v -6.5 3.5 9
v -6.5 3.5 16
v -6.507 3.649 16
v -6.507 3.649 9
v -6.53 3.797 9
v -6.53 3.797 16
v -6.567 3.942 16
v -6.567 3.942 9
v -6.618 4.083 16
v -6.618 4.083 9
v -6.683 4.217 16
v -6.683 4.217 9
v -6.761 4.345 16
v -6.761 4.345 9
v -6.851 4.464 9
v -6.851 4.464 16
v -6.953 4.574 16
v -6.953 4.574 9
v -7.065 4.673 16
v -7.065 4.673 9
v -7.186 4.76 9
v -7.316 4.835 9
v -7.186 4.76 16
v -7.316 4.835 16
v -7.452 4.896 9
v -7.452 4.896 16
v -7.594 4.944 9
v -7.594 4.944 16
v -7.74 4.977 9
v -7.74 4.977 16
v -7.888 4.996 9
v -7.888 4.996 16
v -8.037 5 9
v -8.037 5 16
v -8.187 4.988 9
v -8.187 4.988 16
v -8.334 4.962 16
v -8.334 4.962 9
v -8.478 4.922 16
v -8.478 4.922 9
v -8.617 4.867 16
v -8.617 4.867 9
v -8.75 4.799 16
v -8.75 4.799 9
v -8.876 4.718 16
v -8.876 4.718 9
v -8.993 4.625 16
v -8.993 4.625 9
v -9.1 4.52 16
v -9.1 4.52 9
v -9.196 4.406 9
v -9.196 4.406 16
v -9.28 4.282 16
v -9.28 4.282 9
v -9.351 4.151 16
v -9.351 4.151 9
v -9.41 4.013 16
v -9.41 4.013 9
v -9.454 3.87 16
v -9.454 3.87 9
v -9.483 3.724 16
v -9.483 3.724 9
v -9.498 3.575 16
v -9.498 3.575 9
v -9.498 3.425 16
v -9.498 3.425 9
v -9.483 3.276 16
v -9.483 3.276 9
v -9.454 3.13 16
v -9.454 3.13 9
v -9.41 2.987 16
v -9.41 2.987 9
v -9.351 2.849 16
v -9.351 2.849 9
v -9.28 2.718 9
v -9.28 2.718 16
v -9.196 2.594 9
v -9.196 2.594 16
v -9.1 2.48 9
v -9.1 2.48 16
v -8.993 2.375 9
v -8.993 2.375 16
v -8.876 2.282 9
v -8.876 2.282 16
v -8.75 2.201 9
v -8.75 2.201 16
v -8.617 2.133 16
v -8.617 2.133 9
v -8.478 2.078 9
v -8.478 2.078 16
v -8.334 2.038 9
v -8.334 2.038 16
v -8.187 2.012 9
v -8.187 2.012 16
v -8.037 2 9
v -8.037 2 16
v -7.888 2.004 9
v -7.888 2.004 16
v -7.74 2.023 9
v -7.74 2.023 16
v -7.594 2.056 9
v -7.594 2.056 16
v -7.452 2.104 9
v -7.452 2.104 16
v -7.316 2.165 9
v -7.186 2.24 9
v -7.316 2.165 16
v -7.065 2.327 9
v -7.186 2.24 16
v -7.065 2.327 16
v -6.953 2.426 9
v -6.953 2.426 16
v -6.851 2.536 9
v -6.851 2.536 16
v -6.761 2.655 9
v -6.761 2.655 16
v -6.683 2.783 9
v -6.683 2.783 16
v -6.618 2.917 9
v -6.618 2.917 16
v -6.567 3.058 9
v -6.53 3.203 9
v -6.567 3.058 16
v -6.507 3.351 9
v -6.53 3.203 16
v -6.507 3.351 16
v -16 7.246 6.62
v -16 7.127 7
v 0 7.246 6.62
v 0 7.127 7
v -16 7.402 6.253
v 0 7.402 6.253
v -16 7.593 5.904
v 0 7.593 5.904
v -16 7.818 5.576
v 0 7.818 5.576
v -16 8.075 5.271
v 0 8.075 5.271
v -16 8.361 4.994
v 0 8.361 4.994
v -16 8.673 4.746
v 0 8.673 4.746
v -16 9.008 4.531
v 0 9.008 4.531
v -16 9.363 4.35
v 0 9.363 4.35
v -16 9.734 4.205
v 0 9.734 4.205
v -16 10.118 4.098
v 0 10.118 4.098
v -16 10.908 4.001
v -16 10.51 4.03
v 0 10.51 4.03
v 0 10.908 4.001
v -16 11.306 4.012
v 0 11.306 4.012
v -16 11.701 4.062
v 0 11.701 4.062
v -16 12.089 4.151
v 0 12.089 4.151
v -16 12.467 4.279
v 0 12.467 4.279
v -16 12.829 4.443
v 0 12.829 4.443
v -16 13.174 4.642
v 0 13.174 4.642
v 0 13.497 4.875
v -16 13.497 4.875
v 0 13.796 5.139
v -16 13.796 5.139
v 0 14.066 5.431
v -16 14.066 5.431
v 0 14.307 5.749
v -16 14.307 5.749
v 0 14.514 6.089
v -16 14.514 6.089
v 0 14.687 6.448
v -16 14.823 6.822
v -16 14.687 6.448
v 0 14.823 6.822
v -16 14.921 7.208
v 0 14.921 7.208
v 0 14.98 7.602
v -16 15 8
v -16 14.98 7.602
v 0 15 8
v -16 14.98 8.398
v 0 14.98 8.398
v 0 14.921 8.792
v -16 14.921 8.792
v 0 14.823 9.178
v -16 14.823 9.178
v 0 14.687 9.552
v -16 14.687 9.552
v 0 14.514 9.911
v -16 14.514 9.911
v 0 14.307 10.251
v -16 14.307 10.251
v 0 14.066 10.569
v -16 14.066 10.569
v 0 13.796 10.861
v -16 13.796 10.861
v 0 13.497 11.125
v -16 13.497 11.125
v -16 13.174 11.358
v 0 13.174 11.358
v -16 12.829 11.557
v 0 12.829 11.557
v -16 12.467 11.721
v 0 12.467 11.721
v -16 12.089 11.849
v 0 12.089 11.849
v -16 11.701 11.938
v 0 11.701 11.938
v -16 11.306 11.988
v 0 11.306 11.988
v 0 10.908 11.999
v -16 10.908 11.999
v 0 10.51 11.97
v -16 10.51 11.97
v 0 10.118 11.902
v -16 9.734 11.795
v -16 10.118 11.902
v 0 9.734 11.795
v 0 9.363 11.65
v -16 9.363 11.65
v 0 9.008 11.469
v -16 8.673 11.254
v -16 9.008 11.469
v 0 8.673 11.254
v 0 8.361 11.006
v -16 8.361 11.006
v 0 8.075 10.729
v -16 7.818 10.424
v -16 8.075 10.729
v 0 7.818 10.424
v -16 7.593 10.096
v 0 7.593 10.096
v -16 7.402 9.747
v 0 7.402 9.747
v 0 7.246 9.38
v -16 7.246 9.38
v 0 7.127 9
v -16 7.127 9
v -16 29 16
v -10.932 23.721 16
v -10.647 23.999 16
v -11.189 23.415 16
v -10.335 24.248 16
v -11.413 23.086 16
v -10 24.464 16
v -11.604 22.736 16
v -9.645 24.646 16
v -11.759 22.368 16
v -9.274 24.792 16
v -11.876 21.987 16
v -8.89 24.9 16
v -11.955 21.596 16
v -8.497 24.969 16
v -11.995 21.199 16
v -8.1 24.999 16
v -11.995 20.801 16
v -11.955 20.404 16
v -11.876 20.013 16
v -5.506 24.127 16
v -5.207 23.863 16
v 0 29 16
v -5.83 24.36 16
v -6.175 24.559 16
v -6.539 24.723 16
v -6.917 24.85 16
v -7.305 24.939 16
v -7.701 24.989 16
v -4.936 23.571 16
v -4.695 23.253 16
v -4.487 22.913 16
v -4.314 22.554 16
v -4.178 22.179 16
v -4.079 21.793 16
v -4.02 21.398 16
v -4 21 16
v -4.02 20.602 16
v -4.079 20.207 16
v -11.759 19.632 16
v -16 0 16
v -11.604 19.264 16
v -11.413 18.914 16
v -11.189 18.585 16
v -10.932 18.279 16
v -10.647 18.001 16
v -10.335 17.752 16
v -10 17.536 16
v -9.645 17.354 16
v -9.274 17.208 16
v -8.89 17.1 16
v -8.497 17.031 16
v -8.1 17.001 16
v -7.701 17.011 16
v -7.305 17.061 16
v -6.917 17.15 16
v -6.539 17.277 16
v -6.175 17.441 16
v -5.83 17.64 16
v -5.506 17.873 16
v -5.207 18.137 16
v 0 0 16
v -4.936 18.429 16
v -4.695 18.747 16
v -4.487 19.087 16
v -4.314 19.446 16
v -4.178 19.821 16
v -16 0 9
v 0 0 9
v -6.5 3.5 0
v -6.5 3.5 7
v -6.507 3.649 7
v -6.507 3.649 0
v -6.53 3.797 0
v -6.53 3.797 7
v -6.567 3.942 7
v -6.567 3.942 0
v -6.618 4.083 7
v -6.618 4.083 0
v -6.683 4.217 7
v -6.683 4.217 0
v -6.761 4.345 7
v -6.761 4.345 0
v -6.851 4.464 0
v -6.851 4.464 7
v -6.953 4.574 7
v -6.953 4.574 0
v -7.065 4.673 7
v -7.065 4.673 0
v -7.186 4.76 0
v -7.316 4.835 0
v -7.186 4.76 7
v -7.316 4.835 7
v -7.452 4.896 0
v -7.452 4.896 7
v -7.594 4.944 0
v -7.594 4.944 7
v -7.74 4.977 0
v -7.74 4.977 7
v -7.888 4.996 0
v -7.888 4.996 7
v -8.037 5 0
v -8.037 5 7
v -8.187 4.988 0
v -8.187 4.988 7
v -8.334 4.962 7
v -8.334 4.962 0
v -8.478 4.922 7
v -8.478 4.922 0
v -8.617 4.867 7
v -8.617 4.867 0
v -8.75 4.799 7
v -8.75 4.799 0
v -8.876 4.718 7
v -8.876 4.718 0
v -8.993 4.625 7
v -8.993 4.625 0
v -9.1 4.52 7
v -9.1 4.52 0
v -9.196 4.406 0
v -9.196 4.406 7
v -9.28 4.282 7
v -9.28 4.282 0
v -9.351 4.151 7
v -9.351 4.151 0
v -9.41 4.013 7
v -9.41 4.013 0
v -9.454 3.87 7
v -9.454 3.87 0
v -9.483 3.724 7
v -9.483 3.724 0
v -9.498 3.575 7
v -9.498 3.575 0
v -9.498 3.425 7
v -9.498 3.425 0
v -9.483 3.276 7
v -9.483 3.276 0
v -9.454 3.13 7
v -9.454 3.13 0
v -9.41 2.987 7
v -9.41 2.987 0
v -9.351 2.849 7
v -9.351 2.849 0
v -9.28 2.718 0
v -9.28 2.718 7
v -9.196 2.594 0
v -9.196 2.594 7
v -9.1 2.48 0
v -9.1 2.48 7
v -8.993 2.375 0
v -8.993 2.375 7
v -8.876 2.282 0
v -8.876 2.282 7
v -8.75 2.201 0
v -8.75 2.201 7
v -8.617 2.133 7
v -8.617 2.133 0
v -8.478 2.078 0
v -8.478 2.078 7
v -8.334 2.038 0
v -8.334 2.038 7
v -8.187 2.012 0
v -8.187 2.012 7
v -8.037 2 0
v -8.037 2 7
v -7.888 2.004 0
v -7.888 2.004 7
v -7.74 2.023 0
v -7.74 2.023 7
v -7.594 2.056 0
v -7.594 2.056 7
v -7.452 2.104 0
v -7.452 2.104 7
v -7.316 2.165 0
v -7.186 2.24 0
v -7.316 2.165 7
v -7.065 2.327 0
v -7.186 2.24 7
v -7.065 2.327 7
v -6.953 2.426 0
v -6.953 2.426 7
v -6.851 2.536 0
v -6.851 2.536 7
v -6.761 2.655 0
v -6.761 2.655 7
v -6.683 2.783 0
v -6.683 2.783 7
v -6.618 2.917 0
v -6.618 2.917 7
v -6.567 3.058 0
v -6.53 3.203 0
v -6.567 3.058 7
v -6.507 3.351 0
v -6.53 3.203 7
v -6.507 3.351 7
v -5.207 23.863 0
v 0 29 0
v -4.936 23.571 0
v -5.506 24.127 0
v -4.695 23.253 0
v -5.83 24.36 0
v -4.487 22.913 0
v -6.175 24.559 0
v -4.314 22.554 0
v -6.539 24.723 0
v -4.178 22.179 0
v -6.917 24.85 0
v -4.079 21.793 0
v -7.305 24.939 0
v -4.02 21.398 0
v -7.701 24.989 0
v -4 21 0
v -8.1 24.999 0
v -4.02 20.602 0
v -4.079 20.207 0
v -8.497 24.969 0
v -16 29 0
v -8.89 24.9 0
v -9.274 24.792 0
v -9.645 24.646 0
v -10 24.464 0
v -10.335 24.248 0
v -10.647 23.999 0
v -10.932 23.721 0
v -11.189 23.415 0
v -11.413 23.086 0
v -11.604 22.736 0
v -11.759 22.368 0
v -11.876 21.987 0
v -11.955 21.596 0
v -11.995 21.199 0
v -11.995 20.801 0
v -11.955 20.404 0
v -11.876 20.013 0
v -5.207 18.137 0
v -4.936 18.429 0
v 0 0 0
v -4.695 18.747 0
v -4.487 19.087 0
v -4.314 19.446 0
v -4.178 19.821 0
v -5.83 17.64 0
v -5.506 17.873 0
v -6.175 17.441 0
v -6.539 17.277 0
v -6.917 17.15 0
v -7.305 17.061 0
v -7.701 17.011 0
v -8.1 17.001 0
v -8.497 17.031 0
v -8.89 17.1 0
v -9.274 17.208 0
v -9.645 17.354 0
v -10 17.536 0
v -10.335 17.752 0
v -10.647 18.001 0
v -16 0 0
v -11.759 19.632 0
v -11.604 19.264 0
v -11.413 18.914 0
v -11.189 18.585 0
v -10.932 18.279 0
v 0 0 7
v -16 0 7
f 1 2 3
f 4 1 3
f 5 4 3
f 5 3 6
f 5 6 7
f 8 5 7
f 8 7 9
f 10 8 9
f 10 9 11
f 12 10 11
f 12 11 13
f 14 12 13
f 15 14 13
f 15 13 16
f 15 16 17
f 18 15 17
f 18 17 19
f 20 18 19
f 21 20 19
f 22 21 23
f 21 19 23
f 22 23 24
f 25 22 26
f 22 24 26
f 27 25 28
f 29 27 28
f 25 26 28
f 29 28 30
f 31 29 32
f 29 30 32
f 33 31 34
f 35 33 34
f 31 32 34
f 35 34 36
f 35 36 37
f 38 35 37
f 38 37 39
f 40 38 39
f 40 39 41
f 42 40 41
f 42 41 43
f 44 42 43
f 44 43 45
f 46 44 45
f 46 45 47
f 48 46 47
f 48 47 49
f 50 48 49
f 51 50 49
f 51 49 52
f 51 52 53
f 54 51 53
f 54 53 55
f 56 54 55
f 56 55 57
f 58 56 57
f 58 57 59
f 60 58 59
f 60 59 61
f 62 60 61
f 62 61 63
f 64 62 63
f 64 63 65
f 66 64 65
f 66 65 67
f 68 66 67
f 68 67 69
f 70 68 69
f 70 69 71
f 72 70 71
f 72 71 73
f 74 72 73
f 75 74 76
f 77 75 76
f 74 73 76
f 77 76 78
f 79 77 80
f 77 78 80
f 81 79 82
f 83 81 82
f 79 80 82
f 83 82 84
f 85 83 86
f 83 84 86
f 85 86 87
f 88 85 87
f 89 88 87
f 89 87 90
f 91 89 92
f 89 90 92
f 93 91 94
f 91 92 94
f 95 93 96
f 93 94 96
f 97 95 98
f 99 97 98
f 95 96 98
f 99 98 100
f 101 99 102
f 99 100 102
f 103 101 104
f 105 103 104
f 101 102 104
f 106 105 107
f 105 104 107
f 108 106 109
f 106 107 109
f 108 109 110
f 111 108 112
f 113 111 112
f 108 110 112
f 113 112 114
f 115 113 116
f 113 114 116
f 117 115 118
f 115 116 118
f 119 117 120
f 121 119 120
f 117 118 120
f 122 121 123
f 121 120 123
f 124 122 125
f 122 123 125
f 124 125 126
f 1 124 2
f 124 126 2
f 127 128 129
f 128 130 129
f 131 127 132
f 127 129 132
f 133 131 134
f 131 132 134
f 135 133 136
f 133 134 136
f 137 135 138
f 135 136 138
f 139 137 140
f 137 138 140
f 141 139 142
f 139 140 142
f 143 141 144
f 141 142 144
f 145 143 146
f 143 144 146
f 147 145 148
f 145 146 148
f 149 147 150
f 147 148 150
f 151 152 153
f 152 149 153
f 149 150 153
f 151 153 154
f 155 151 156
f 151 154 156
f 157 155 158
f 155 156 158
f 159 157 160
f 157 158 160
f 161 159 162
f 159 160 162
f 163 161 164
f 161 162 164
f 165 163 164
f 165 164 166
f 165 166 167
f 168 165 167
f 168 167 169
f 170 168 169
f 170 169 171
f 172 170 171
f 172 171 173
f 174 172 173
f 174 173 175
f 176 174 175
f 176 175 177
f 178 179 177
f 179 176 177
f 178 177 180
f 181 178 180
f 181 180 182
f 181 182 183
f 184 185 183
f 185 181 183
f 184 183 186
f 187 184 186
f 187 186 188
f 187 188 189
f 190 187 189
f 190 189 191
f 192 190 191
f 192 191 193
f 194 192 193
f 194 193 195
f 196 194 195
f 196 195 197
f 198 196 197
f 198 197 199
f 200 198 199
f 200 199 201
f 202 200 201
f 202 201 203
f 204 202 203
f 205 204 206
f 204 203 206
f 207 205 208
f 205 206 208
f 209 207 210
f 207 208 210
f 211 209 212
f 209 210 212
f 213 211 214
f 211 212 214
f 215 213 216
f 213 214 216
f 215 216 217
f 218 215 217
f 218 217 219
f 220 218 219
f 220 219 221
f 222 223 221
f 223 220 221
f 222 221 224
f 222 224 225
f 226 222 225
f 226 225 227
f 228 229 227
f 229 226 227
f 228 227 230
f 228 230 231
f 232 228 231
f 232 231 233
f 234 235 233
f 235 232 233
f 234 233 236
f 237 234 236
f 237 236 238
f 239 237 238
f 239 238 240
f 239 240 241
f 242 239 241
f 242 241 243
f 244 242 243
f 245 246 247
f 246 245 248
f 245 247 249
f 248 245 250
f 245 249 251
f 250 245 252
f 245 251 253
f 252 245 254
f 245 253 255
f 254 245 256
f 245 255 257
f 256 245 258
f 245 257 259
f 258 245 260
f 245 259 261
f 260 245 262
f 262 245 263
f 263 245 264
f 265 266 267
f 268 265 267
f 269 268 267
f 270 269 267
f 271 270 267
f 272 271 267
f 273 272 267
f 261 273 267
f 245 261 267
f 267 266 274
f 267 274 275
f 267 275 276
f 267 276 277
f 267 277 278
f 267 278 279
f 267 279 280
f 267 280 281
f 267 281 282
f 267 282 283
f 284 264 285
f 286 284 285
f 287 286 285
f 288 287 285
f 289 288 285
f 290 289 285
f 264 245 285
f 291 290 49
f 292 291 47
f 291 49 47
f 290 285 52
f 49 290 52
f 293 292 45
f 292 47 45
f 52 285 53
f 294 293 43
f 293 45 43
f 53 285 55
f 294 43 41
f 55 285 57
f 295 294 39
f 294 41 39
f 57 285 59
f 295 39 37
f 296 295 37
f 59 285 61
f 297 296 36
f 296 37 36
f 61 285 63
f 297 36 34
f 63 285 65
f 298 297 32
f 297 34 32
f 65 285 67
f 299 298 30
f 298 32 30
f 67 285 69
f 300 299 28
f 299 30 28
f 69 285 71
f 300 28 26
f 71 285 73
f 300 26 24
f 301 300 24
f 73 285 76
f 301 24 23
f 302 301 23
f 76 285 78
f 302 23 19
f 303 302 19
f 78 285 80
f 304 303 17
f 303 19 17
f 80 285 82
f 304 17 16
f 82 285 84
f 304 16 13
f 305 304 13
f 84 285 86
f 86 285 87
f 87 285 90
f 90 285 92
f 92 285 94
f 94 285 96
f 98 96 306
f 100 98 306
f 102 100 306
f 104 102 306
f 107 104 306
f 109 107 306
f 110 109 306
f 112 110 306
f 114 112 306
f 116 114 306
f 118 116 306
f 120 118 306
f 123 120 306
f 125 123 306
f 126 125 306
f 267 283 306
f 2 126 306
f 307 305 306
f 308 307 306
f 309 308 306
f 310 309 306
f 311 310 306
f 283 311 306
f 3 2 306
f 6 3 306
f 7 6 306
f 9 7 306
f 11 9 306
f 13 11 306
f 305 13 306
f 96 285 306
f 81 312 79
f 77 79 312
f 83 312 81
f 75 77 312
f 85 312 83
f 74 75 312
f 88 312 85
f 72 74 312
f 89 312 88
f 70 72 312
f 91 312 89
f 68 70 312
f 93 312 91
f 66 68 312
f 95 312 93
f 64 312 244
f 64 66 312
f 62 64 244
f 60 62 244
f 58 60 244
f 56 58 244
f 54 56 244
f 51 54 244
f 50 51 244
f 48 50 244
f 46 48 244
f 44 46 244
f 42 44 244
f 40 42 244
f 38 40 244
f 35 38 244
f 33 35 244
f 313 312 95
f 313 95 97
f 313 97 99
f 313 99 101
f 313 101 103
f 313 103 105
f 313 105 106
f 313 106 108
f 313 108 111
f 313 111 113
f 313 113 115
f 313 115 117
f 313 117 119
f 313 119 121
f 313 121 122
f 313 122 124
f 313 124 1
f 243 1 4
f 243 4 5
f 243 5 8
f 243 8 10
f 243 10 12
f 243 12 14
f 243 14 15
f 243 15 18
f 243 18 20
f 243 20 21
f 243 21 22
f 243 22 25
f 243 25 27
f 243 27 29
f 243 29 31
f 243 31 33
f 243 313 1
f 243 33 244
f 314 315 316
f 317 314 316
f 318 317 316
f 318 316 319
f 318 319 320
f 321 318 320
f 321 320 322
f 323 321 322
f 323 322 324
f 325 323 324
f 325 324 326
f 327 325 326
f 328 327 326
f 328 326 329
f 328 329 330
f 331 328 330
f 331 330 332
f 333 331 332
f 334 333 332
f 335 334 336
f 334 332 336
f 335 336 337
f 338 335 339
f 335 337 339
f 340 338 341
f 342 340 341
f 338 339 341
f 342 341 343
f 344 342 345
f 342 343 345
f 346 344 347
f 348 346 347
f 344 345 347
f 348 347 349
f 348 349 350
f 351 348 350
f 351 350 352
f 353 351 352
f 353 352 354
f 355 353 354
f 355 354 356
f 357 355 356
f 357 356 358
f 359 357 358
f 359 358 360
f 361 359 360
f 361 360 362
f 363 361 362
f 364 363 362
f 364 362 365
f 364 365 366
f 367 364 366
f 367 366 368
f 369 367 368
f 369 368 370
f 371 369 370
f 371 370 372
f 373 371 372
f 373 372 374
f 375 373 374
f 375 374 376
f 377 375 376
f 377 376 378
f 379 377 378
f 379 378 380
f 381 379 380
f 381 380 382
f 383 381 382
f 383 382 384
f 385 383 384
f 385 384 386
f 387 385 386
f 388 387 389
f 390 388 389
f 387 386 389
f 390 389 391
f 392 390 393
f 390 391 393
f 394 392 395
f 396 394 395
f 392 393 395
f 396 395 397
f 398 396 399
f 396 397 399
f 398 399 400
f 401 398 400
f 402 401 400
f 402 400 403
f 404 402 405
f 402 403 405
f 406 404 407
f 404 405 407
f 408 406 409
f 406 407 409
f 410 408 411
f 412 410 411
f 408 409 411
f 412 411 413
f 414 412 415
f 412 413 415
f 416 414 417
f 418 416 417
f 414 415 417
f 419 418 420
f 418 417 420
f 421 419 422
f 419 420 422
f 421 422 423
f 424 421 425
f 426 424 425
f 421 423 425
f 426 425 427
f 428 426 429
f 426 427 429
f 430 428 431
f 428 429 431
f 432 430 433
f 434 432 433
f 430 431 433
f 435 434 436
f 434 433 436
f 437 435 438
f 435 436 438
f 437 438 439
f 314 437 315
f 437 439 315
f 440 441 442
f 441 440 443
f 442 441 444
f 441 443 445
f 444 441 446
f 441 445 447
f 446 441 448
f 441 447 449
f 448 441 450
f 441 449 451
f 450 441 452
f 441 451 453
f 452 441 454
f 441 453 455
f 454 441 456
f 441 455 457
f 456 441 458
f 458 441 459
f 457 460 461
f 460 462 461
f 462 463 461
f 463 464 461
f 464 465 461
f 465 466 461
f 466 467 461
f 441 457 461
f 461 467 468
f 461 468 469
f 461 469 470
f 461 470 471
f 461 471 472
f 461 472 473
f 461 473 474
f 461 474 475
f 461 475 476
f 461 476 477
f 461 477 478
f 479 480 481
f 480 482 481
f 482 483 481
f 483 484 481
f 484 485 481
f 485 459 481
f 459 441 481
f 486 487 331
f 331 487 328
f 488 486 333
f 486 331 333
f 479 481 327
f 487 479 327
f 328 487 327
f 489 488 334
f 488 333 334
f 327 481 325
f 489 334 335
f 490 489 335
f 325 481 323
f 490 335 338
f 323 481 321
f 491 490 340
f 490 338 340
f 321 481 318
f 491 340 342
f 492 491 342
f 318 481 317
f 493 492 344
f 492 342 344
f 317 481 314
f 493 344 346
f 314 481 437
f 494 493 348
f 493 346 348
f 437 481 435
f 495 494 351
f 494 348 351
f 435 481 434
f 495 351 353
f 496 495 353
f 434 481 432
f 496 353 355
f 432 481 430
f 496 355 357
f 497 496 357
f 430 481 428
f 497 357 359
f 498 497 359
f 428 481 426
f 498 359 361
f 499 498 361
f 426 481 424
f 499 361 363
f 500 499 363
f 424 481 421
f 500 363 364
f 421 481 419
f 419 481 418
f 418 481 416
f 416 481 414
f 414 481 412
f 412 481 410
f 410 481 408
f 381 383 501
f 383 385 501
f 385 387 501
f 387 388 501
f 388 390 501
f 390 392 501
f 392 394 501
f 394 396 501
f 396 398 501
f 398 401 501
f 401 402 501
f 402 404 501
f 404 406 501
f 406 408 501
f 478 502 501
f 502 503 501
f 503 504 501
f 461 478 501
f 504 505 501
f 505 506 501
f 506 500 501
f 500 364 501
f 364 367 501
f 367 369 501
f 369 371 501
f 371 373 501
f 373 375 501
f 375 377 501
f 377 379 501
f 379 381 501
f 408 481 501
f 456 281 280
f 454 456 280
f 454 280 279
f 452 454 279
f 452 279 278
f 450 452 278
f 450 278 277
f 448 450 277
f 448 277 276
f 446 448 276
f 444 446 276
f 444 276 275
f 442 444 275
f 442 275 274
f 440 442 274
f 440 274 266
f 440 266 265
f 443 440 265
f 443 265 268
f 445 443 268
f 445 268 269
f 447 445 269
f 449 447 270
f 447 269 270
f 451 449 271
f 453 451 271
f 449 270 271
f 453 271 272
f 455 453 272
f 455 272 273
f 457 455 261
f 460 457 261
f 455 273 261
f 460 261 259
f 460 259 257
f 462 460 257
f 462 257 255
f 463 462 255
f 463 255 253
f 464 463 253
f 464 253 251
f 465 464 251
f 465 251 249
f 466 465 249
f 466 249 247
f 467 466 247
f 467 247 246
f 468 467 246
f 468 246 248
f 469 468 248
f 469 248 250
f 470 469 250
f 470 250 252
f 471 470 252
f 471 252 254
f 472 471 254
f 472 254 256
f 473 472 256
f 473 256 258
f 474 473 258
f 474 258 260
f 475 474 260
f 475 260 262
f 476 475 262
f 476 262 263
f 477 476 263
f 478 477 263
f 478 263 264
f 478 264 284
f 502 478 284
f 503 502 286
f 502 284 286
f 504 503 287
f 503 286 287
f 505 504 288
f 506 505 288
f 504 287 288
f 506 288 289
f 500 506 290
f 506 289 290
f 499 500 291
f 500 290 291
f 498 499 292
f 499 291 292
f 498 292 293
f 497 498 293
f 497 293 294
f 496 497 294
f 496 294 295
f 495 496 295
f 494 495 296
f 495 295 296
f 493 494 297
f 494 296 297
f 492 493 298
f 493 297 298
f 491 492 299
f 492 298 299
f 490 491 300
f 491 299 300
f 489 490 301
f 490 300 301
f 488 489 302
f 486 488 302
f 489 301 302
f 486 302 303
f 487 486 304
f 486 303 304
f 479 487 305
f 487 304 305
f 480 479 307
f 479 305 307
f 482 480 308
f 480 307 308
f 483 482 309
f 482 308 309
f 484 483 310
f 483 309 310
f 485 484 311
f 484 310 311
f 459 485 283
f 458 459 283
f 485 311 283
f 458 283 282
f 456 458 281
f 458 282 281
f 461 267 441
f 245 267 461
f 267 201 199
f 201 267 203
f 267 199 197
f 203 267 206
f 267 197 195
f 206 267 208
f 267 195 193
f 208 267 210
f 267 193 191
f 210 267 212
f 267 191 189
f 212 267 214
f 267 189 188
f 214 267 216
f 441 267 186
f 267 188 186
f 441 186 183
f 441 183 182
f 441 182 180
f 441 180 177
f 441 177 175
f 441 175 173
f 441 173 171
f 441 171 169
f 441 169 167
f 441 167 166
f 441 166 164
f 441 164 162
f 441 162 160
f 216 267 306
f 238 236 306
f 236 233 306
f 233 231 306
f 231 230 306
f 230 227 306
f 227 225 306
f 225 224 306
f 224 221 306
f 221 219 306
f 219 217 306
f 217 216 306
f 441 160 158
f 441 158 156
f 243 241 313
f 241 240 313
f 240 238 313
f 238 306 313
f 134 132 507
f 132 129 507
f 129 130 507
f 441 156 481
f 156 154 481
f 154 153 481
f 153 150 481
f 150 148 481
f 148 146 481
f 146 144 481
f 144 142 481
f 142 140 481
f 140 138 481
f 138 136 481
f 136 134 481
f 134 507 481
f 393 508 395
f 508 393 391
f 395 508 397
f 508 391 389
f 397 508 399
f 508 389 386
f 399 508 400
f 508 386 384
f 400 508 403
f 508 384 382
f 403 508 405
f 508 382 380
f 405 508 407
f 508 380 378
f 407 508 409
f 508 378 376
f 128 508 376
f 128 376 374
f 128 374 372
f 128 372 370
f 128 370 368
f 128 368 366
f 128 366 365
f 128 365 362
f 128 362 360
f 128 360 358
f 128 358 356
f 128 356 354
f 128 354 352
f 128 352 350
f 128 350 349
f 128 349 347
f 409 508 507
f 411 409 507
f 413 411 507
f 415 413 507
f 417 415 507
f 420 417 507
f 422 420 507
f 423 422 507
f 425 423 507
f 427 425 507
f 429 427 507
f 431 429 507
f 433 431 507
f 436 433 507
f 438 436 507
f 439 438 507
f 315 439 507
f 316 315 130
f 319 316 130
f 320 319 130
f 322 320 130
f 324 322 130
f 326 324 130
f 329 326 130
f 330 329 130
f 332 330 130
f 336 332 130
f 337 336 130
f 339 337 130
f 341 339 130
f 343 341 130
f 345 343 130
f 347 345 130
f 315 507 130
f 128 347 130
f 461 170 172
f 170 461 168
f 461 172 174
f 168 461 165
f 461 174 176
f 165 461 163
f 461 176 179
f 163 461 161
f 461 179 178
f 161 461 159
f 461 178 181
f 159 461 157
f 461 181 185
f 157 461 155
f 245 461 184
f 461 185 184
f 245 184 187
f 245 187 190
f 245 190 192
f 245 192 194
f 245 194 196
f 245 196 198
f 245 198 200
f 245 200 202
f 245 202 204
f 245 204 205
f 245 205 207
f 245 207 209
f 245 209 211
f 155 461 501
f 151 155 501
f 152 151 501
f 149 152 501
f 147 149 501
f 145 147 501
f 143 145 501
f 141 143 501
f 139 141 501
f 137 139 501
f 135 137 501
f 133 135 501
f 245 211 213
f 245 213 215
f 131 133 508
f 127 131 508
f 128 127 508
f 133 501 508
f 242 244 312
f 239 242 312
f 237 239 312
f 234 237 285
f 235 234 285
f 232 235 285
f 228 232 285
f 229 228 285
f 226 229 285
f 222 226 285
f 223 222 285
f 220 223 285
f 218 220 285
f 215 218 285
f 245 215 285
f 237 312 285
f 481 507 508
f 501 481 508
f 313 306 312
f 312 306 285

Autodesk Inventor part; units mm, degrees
ref_plane "YZ Plane" through (0, 0, 0) normal (1, 0, 0) x (0, 1, 0)
ref_plane "XZ Plane" through (0, 0, 0) normal (0, 1, 0) x (-1, 0, 0)
ref_plane "XY Plane" through (0, 0, 0) normal (0, 0, 1) x (1, 0, 0)
sketch "Sketch1" plane through (0, 0, 0) normal (0, 1, 0) x (-1, 0, 0)
  line L0 (0, 0) -> (16, 0)
  line L1 (16, 0) -> (16, 16)
  line L2 (16, 16) -> (0, 16)
  line L3 (0, 16) -> (0, 0)
  dimension "d0" = 16
  dimension "d1" = 16
extrude "Extrusion1" add sketch "Sketch1" along normal blind 29
sketch "Sketch2" plane through (-16, 0, 16) normal (0, 0, 1) x (1, 0, 0)
  circle A0 centre (8, 3.5) radius 1.5
  circle A1 centre (8, 21) radius 4
  dimension "d5" = 3
  dimension "d7" = 8
extrude "Extrusion2" cut sketch "Sketch2" against normal blind 29
sketch "Sketch3" plane through (0, 0, 16) normal (1, 0, 0) x (0, 0, -1)
  line L0 (0, 0) -> (16, 0) projected
  line L1 (16, 0) -> (16, 29) projected
  line L2 (0, 0) -> (0, 29) projected
  line L3 (0, 0) -> (0, 11)
  arc A0 (9, 7.127) -> (7, 7.127) centre (8, 11) ccw
  line L4 (8, 0) -> (9, 0)
  line L5 (9, 0) -> (9, 7.127)
  line L6 (8, 0) -> (7, 0)
  line L7 (7, 0) -> (7, 7.127)
  line L8 (0, 11) -> (4, 11)
  line L9 (12, 11) -> (16, 11)
  dimension "d10" = 11
  dimension "d11" = 8
  dimension "d12" = 1
  dimension "d13" = 1
extrude "Extrusion3" cut sketch "Sketch3" against normal blind 29 contours L7 A0 L5 L0
properties part number "BarClamp_V3" material "Birch"
